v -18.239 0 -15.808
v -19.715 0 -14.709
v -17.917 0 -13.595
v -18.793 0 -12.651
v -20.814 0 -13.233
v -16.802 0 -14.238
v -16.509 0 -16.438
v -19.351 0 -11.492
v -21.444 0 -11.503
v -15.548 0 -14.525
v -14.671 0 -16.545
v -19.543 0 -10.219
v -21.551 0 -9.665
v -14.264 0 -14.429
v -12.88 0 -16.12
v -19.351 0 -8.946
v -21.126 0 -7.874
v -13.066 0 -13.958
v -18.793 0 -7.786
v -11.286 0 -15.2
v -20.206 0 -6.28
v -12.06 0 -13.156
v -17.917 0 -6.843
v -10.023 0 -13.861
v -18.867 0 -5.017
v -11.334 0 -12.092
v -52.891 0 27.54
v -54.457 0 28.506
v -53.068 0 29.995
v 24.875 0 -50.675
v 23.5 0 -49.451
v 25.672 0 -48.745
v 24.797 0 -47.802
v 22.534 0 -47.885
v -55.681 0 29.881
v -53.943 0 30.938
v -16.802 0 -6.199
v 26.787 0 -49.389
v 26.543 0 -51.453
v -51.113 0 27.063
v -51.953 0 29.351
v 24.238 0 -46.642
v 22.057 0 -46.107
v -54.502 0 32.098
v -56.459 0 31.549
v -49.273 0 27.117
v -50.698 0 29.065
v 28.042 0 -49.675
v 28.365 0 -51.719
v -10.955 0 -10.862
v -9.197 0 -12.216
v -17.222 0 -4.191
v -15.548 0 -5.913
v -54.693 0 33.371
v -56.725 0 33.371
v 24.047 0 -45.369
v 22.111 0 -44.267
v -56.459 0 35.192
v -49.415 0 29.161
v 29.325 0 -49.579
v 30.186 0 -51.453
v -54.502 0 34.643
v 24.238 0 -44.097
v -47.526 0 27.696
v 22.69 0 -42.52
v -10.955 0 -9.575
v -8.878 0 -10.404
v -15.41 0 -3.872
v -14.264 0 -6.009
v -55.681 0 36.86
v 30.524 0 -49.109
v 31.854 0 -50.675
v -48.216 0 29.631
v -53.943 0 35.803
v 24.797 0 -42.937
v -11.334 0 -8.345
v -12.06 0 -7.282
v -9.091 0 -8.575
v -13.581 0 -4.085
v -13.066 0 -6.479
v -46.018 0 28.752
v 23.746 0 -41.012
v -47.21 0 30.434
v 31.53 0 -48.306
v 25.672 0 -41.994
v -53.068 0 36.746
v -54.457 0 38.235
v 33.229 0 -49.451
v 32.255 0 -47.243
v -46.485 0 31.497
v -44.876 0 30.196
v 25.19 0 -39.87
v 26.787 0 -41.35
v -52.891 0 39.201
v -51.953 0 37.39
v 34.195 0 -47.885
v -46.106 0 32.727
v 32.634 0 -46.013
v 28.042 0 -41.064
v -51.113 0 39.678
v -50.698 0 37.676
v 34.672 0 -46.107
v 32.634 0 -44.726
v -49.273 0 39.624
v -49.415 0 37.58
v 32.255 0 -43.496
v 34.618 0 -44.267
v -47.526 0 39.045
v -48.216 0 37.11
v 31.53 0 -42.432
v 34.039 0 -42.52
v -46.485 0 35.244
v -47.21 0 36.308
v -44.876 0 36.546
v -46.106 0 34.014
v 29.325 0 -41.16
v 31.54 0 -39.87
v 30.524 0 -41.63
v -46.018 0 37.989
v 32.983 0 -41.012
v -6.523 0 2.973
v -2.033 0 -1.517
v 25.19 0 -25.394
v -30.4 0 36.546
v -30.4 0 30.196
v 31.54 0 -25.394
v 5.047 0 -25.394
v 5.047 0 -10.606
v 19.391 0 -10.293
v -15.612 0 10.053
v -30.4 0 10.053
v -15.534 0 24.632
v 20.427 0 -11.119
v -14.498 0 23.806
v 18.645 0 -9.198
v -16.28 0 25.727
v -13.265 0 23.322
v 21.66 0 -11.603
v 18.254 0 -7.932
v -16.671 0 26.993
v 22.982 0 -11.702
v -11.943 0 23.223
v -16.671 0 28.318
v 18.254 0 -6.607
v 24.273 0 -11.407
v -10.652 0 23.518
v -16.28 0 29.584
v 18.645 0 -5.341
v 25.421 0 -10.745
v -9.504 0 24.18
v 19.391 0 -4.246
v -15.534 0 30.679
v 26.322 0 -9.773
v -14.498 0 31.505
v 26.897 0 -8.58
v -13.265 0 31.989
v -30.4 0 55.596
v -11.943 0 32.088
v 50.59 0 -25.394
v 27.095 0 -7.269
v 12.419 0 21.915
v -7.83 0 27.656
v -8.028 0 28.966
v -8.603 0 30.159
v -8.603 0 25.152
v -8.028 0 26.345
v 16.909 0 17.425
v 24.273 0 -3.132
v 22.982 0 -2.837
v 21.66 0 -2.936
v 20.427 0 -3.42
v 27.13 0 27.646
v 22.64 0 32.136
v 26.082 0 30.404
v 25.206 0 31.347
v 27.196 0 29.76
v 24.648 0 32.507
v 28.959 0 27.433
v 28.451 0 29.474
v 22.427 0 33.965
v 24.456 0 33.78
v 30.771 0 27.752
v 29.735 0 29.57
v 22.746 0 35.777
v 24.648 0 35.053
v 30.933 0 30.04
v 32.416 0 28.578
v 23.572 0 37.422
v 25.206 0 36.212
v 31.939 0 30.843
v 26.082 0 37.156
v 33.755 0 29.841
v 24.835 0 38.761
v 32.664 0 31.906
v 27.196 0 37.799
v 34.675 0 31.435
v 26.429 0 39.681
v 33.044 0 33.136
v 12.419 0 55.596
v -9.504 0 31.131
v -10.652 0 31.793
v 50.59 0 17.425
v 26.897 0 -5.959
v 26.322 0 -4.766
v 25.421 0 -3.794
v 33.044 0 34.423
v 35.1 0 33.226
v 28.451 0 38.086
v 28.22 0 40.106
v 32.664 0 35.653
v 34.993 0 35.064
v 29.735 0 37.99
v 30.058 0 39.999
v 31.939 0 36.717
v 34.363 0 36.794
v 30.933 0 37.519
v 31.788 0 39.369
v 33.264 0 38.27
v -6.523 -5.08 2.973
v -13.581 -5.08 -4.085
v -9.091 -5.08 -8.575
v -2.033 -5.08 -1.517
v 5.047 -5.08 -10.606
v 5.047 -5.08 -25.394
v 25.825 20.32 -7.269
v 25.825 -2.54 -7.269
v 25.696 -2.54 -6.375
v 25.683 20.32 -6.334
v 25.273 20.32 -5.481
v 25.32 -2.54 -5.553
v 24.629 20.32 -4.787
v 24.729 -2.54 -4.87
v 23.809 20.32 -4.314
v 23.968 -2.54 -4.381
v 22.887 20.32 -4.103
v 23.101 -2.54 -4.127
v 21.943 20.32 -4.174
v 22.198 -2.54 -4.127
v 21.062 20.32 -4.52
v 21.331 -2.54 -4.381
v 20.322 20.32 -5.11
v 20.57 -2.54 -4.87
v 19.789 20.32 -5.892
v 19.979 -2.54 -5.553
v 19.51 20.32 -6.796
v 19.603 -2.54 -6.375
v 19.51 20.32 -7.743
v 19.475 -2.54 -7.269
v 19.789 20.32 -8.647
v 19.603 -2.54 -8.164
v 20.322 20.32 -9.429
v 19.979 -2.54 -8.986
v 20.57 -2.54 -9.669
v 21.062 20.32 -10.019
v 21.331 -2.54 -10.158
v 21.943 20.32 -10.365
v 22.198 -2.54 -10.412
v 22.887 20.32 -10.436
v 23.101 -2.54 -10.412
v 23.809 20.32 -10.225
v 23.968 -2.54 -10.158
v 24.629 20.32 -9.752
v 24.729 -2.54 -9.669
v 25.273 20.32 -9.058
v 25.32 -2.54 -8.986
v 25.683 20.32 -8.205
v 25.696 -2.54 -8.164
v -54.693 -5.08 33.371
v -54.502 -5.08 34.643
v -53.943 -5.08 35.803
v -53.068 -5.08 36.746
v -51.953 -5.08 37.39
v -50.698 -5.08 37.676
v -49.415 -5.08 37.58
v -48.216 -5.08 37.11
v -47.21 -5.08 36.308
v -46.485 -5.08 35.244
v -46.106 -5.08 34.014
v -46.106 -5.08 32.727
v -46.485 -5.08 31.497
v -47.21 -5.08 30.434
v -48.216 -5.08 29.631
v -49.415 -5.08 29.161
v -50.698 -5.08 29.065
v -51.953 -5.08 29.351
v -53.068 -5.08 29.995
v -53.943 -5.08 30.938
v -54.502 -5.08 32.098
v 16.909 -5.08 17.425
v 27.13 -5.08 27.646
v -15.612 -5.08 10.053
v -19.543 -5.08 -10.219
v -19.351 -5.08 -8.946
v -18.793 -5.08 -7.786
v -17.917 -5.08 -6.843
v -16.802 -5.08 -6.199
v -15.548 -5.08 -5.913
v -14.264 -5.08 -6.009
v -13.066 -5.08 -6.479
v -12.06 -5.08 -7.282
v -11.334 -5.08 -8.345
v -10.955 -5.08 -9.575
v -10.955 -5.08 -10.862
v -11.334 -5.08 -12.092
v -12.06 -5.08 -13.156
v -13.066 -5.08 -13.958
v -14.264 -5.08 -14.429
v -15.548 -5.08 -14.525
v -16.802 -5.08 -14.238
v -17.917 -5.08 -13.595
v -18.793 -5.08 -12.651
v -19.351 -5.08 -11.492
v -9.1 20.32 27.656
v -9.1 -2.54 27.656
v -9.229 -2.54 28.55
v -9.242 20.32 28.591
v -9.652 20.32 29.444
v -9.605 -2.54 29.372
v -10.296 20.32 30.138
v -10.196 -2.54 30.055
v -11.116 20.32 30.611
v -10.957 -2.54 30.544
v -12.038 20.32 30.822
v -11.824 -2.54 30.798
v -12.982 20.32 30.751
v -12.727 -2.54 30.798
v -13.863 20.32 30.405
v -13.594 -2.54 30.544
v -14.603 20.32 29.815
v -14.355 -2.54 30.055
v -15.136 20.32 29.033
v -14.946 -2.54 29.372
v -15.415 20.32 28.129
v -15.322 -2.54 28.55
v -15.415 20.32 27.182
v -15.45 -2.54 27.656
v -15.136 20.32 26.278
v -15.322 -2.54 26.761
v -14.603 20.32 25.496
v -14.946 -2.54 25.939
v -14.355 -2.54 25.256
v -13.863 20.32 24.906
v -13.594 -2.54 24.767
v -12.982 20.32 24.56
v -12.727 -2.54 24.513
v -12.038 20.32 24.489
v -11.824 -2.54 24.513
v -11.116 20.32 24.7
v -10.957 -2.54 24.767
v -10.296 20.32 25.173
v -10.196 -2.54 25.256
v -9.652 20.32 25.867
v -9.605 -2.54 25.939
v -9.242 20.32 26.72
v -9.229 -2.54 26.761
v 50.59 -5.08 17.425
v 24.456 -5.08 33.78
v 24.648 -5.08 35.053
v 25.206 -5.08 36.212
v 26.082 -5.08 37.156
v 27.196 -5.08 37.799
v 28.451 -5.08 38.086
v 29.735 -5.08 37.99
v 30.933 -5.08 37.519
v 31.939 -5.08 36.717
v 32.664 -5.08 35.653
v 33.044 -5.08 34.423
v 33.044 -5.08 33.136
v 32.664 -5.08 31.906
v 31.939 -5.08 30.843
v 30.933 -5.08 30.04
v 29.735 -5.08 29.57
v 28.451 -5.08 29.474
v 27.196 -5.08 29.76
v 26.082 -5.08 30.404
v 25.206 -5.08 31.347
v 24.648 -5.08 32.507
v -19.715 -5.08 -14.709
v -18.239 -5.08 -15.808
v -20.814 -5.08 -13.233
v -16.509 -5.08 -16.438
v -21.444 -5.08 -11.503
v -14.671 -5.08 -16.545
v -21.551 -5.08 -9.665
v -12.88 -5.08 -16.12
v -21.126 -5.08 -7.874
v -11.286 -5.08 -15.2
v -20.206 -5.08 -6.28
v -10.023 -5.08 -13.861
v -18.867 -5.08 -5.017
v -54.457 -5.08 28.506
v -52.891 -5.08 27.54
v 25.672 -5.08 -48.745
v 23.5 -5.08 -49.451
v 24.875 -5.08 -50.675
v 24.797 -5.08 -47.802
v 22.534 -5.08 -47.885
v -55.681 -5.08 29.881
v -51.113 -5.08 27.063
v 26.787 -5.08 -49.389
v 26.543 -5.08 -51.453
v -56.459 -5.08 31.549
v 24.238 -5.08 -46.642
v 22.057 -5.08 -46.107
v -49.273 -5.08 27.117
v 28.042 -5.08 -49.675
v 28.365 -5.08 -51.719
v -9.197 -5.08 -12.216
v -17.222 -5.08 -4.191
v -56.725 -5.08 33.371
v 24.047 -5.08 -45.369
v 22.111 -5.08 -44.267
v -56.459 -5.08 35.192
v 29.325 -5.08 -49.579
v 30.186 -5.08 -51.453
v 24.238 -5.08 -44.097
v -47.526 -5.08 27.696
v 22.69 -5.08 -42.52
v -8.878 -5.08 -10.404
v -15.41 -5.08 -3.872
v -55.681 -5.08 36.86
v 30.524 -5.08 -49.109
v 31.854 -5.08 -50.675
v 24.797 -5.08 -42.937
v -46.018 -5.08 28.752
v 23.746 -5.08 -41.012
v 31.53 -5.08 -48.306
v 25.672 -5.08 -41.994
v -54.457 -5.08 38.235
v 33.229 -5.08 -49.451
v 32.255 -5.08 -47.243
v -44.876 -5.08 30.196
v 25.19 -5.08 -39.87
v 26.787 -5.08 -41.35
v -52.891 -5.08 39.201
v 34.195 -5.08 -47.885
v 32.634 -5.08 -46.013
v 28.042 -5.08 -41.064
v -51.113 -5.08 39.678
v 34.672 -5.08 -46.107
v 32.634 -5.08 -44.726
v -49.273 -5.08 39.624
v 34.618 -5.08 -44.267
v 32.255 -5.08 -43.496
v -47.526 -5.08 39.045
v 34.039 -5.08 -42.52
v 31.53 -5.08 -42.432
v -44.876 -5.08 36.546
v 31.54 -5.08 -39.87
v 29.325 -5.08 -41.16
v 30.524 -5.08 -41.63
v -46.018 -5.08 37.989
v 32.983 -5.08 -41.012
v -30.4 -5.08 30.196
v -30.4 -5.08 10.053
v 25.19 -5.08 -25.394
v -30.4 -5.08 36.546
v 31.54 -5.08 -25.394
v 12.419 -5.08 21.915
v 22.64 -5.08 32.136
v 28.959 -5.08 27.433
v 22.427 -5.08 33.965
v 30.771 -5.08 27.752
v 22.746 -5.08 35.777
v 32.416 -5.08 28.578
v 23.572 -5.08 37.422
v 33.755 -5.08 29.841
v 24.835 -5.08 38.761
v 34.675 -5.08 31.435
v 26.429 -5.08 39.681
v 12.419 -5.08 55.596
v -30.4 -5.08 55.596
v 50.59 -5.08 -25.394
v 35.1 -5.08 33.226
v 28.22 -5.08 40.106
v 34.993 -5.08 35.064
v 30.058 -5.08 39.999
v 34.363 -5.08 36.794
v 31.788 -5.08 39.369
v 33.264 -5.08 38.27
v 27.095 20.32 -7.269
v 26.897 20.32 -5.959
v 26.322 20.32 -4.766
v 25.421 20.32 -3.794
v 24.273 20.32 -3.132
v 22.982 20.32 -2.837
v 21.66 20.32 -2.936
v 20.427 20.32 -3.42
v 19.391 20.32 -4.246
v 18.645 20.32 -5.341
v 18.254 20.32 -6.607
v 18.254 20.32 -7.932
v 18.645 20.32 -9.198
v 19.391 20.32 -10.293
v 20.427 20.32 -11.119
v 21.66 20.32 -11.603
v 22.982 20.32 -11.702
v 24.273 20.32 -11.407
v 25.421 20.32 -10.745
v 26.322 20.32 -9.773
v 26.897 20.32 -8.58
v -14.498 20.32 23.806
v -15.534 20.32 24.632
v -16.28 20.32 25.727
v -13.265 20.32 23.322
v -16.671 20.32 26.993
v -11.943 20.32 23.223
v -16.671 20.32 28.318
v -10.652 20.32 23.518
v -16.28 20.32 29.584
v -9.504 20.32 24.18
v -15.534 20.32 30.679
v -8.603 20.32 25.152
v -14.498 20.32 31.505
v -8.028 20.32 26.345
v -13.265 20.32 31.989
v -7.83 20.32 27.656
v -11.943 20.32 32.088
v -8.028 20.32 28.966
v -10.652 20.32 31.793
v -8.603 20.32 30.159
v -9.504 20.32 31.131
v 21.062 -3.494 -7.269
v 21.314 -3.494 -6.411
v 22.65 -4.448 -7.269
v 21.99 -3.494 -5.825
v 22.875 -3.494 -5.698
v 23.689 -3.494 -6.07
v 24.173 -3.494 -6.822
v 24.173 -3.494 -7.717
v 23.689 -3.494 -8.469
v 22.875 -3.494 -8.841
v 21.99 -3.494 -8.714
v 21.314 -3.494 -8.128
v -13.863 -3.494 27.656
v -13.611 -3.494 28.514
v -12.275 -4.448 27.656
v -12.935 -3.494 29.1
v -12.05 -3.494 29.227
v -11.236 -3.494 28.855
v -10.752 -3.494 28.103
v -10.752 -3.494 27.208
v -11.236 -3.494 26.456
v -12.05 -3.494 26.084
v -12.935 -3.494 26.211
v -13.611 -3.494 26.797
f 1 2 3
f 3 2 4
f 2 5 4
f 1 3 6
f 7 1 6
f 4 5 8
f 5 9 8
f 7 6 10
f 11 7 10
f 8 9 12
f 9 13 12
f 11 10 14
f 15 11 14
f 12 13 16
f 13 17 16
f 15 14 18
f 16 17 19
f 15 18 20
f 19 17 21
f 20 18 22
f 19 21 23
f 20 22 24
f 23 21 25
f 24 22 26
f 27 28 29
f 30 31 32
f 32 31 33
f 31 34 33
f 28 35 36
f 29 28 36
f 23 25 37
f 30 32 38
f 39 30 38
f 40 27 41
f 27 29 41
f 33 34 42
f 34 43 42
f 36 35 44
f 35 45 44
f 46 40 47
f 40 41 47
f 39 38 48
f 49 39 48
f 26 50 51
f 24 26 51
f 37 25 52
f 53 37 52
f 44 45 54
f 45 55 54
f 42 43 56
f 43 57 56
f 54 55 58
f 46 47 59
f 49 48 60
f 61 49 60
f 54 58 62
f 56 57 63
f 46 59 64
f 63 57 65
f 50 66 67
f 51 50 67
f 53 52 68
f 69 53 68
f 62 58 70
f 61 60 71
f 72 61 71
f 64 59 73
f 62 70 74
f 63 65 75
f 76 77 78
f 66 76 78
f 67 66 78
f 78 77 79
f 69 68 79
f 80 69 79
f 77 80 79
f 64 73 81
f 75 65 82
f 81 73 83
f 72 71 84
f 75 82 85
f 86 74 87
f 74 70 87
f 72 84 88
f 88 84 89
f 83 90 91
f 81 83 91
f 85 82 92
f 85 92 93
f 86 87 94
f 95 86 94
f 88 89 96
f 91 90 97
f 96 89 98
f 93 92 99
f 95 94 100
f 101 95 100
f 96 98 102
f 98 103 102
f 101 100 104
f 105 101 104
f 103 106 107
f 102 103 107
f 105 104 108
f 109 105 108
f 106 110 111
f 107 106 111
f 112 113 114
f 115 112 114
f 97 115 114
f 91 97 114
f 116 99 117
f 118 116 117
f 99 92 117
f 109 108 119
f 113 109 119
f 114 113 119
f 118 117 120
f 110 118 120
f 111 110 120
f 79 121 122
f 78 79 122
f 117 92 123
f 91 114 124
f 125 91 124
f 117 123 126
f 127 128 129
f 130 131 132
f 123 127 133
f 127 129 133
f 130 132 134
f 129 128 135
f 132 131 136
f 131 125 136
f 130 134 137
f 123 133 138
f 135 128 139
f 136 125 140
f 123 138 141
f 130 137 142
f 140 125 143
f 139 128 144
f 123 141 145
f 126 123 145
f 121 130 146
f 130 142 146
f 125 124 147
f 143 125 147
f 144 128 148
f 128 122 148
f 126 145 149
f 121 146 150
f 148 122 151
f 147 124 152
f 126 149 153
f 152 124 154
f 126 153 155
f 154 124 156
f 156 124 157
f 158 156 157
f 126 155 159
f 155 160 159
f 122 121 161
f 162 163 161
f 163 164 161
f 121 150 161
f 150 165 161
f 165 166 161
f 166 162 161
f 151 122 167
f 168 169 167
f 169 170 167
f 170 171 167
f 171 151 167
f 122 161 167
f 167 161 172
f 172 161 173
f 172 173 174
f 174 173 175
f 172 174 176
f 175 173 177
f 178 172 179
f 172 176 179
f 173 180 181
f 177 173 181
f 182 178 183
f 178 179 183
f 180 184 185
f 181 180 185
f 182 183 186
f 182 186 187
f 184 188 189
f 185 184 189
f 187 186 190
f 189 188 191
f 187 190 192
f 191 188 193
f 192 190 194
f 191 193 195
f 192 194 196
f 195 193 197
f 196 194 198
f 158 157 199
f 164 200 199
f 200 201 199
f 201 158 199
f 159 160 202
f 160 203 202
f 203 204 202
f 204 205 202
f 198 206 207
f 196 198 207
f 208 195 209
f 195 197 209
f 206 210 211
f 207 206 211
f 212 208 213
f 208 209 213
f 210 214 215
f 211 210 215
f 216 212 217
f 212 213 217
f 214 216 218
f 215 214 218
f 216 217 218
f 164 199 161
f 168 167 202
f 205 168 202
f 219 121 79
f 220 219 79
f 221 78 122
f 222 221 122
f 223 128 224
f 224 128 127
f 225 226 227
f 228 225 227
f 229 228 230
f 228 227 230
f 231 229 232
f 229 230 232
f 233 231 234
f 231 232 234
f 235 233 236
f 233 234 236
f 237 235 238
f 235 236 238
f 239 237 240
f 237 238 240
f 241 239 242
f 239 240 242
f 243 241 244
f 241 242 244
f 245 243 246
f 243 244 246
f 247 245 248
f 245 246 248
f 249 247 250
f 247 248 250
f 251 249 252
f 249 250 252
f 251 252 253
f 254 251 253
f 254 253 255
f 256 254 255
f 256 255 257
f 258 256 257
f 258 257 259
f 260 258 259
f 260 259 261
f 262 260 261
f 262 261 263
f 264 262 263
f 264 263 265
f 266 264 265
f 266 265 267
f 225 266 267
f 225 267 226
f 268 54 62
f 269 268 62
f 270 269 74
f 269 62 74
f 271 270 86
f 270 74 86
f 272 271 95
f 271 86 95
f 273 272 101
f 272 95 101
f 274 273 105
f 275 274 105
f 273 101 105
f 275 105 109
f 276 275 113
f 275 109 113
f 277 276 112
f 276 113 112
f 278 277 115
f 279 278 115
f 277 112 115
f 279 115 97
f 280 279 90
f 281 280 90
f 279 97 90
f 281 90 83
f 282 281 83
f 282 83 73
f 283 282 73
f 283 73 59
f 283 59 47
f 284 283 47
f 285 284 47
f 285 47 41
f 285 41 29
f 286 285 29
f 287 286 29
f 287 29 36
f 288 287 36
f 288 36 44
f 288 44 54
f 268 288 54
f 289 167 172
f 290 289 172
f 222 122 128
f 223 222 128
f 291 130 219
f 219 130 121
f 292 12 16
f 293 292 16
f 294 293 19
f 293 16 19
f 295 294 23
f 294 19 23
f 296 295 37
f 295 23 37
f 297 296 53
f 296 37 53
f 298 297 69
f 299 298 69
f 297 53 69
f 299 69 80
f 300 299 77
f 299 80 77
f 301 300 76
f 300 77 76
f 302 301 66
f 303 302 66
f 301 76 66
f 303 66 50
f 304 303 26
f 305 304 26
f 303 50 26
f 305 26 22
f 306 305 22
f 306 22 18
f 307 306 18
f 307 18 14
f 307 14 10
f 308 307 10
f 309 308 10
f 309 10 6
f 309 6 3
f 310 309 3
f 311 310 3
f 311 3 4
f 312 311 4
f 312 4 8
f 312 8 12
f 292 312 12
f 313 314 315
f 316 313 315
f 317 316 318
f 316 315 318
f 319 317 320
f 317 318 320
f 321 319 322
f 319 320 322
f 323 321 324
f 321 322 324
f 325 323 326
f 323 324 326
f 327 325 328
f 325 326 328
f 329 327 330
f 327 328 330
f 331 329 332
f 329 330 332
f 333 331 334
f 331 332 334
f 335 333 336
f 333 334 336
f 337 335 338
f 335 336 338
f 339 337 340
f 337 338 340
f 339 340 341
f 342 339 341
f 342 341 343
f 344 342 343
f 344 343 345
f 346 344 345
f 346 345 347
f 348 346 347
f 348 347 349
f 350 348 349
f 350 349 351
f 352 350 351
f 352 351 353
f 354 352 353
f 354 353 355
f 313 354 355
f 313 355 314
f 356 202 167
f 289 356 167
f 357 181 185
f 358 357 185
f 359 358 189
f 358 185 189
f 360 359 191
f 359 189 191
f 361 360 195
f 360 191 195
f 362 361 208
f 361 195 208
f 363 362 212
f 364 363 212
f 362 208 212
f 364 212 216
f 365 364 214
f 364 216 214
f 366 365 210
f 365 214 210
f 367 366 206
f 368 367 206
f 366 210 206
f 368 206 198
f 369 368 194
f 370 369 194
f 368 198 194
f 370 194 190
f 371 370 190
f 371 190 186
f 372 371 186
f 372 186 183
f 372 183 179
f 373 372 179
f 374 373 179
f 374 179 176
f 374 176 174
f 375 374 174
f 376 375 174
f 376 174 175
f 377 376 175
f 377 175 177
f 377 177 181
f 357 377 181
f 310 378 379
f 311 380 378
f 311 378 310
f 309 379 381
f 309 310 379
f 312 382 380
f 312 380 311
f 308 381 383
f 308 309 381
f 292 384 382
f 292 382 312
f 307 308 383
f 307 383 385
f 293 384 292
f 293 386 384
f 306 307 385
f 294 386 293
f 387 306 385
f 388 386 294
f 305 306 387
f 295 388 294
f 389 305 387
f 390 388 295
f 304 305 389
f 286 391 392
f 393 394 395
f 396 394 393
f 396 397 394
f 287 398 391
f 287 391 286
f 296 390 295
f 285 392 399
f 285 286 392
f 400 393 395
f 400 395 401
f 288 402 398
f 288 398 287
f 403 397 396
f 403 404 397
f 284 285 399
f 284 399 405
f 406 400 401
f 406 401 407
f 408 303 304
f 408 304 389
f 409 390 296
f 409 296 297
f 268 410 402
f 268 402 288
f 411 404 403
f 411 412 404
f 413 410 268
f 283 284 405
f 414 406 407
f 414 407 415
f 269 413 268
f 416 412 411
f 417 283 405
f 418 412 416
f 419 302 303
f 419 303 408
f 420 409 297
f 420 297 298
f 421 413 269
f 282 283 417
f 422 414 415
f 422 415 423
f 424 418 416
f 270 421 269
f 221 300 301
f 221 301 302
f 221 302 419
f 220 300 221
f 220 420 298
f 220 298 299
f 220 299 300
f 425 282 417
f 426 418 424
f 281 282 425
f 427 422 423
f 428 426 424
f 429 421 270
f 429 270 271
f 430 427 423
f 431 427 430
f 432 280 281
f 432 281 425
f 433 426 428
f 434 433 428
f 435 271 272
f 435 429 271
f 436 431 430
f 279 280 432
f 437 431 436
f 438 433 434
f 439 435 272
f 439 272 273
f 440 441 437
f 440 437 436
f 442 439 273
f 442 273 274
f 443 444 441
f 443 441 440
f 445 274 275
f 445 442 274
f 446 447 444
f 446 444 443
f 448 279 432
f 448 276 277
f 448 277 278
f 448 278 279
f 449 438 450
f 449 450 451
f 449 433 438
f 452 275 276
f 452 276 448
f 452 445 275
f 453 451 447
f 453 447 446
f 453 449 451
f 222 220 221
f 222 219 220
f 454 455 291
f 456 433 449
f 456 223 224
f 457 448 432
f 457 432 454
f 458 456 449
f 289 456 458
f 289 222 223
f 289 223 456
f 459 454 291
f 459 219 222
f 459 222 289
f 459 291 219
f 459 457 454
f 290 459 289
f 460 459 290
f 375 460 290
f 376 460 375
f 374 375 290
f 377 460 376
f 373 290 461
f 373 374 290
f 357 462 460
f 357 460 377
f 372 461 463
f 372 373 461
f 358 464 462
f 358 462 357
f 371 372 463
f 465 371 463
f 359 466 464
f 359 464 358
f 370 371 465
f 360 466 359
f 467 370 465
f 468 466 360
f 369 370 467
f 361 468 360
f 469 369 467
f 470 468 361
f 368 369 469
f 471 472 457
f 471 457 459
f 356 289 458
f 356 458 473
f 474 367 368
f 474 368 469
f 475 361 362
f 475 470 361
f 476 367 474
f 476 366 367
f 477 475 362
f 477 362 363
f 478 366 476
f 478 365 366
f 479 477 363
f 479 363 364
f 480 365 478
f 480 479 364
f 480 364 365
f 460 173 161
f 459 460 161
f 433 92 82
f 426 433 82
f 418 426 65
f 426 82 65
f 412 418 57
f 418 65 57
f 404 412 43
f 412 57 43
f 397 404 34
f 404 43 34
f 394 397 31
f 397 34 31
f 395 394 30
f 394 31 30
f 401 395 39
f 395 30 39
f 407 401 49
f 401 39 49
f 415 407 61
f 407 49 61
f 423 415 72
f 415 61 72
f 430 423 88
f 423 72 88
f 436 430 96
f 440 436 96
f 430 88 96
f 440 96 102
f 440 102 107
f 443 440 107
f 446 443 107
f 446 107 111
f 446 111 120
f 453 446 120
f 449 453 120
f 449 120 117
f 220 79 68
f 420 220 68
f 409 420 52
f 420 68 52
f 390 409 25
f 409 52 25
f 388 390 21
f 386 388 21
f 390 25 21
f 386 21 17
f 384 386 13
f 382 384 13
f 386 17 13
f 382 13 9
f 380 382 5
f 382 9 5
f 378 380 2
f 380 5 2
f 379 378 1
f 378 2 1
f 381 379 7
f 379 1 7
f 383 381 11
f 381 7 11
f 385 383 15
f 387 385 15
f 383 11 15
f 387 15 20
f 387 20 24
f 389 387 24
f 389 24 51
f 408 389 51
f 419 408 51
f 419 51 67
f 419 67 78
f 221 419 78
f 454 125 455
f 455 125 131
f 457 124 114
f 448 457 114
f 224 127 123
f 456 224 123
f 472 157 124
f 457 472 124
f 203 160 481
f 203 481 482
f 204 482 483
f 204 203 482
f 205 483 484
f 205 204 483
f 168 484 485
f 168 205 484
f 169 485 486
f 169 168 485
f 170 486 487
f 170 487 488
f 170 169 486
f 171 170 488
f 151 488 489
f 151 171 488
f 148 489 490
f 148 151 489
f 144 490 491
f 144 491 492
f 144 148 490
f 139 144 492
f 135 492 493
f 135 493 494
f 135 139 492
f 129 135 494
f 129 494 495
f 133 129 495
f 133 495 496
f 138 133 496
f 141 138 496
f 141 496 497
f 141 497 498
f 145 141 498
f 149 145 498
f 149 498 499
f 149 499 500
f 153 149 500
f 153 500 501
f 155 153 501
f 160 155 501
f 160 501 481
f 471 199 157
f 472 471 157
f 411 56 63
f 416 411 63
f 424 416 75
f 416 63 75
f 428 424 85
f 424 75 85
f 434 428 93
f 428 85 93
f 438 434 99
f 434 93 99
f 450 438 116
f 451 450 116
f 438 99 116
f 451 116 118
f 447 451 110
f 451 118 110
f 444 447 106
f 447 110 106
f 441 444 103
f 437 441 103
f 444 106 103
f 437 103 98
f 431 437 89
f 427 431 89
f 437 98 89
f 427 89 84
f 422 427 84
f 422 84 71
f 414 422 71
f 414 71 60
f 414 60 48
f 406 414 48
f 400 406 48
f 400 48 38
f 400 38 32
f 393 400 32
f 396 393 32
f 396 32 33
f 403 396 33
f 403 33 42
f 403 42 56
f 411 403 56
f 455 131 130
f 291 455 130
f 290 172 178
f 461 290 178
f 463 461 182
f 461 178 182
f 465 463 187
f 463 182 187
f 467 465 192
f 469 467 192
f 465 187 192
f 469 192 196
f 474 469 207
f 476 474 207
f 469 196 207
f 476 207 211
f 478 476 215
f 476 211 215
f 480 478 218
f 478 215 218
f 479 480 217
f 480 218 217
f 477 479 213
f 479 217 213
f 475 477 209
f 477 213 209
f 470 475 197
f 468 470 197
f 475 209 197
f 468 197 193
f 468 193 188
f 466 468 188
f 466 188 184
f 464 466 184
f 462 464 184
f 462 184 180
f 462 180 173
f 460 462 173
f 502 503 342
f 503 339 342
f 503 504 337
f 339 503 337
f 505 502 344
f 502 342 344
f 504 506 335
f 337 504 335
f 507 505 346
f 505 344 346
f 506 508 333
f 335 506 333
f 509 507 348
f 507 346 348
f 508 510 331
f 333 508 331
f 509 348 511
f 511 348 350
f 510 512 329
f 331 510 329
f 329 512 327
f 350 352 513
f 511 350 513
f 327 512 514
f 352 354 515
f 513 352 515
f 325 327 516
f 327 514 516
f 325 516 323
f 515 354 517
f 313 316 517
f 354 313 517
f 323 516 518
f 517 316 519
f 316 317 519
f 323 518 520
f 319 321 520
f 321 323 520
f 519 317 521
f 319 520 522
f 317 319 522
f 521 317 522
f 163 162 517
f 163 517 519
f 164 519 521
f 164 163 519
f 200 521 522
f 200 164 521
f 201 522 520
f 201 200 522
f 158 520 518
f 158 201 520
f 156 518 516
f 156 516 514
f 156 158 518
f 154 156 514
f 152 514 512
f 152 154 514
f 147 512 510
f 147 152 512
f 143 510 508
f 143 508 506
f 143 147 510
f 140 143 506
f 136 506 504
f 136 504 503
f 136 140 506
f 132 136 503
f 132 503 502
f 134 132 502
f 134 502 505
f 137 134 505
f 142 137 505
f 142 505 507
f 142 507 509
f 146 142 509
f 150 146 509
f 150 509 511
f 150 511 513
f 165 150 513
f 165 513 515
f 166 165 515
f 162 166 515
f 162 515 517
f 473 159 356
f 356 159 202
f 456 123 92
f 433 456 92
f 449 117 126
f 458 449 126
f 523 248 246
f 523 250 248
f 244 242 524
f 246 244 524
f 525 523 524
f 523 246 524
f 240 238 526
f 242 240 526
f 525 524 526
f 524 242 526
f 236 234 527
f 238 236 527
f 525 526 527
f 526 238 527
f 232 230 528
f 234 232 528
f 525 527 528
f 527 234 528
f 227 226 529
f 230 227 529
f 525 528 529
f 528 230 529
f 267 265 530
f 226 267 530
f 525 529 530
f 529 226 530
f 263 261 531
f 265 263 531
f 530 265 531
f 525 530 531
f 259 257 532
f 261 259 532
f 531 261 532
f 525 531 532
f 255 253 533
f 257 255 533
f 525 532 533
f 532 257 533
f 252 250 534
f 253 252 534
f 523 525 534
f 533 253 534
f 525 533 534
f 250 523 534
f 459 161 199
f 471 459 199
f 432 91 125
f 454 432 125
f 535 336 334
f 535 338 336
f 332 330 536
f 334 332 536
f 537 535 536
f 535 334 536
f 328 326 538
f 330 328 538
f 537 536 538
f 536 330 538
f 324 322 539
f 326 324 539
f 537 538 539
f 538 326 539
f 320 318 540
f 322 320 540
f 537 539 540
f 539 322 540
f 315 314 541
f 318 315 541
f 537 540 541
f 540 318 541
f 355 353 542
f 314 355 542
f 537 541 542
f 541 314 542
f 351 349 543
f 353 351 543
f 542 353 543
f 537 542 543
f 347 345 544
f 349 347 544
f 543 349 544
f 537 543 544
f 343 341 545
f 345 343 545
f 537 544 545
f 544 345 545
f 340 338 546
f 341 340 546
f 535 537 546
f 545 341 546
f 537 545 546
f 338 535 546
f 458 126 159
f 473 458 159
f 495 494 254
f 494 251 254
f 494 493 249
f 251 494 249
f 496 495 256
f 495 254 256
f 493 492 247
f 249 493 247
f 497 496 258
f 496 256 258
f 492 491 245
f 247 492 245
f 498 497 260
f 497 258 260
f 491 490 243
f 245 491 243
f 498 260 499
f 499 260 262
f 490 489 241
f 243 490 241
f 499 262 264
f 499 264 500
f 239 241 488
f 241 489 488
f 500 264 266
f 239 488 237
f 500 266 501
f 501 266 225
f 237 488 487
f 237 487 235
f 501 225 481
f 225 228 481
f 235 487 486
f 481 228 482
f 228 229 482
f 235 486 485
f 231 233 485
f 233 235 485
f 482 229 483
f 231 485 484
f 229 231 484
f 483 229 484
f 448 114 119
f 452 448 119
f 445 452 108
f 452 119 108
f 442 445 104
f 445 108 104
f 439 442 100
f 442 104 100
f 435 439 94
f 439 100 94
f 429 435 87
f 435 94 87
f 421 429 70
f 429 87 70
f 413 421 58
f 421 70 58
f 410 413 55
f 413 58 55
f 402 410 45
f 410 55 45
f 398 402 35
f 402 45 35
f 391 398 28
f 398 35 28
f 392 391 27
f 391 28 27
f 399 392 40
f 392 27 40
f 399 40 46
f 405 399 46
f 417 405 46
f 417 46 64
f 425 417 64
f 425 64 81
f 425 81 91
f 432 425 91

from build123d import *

# Parameters (mm, degrees)
F0_R                 = 4.445
F1_DEPTH             = 5.08
F2_R                 = 4.445
F3_DEPTH             = 25.4
F4_R                 = 4.318
F5_DEPTH             = 25.4
F8_D                 = 6.35
F8_DEPTH             = 22.86
F8_CBORE_D           = 6.35
F8_CBORE_DEPTH       = 12.7
F8_TIP               = 1.9077324654
F8_ON_F7_D           = 6.35
F8_ON_F7_DEPTH       = 22.86
F8_ON_F7_CBORE_D     = 6.35
F8_ON_F7_CBORE_DEPTH = 12.7
F8_ON_F7_TIP         = 1.9077324654


with BuildPart() as f1:
    # F0 (on Front) → F1 (new body)
    with BuildSketch(Plane.XZ):
        with BuildLine():
            Line((16.9093859117, 17.425267489), (27.1303756598, 27.6462572371))
            ThreePointArc((27.1303756598, 27.6462572371), (33.2640046568, 38.2700142946), (22.6402475993, 32.1363852977))
            Line((22.6402475993, 32.1363852977), (12.4192578512, 21.9153955495))
            Line((12.4192578512, 21.9153955495), (12.4192578512, 36.5455265367))
            Line((12.4192578512, 36.5455265367), (12.4192578512, 55.5955265367))
            Line((12.4192578512, 55.5955265367), (-30.3997510844, 55.5955265367))
            Line((-30.3997510844, 55.5955265367), (-30.3997510844, 36.5455265367))
            Line((-30.3997510844, 36.5455265367), (-44.8762217871, 36.5455265367))
            ThreePointArc((-44.8762217871, 36.5455265367), (-56.7254831011, 33.3705265367), (-44.8762217871, 30.1955265367))
            Line((-44.8762217871, 30.1955265367), (-30.3997510844, 30.1955265367))
            Line((-30.3997510844, 30.1955265367), (-30.3997510844, 16.4088443772))
            Line((-30.3997510844, 16.4088443772), (-30.3997510844, 10.0526214838))
            Line((-30.3997510844, 10.0526214838), (-15.6116463411, 10.0526214838))
            Line((-15.6116463411, 10.0526214838), (-6.5234490096, 2.9726886888))
            Line((-6.5234490096, 2.9726886888), (-13.581341862, -4.0852041636))
            ThreePointArc((-13.581341862, -4.0852041636), (-19.714970859, -14.7089612211), (-9.0912138015, -8.5753322242))
            Line((-9.0912138015, -8.5753322242), (-2.033320949, -1.5174393717))
            Line((-2.033320949, -1.5174393717), (5.046611846, -10.6056367033))
            Line((5.046611846, -10.6056367033), (5.046611846, -25.3937414465))
            Line((5.046611846, -25.3937414465), (11.4028347394, -25.3937414465))
            Line((11.4028347394, -25.3937414465), (25.1895168989, -25.3937414465))
            Line((25.1895168989, -25.3937414465), (25.1895168989, -39.8702121492))
            ThreePointArc((25.1895168989, -39.8702121492), (28.3645168989, -51.7194734633), (31.5395168989, -39.8702121492))
            Line((31.5395168989, -39.8702121492), (31.5395168989, -25.3937414465))
            Line((31.5395168989, -25.3937414465), (50.5895168989, -25.3937414465))
            Line((50.5895168989, -25.3937414465), (50.5895168989, 17.425267489))
            Line((50.5895168989, 17.425267489), (31.5395168989, 17.425267489))
            Line((31.5395168989, 17.425267489), (16.9093859117, 17.425267489))
        make_face()
        with Locations((22.6495168989, -7.2694734633)):
            Circle(F0_R, mode=Mode.SUBTRACT)
        with Locations((-12.2754831011, 27.6555265367)):
            Circle(F0_R, mode=Mode.SUBTRACT)
    extrude(amount=F1_DEPTH)

    # F2 (on face) → F3 (join)
    with BuildSketch(Plane.XZ.offset(5.08)):
        with Locations((-12.2754831011, 27.6555265367)):
            Circle(F2_R)
        with Locations((22.6495168989, -7.2694734633)):
            Circle(F2_R)
    extrude(amount=-F3_DEPTH)

    # F4 (on face) → F5 (cut)
    with BuildSketch(Plane(origin=(0, 0, 0), x_dir=(-1, 0, 0), z_dir=(0, 1, 0))):
        with Locations((-28.7738765962, 33.7798862341)):
            Circle(F4_R)
        with Locations((15.2248427984, -10.2188331606)):
            Circle(F4_R)
        with Locations((50.3754831011, 33.3705265367)):
            Circle(F4_R)
        with Locations((-28.3645168989, -45.3694734633)):
            Circle(F4_R)
    extrude(amount=-F5_DEPTH, mode=Mode.SUBTRACT)

    # F8
    with Locations(Plane(origin=(0, 20.32, 0), x_dir=(-1, 0, 0), z_dir=(0, 1, 0))):
        with Locations((-22.6495168989, -7.2694734633)):
            CounterBoreHole(F8_D / 2, F8_CBORE_D / 2, F8_CBORE_DEPTH, depth=F8_DEPTH)
            with Locations((0, 0, -(F8_DEPTH + F8_TIP / 2))):  # 118° drill point
                Cone(0, F8_D / 2, F8_TIP, mode=Mode.SUBTRACT)

    # F8 on F7
    with Locations(Plane(origin=(0, 20.32, 0), x_dir=(-1, 0, 0), z_dir=(0, 1, 0))):
        with Locations((12.2754831011, 27.6555265367)):
            CounterBoreHole(F8_ON_F7_D / 2, F8_ON_F7_CBORE_D / 2, F8_ON_F7_CBORE_DEPTH, depth=F8_ON_F7_DEPTH)
            with Locations((0, 0, -(F8_ON_F7_DEPTH + F8_ON_F7_TIP / 2))):  # 118° drill point
                Cone(0, F8_ON_F7_D / 2, F8_ON_F7_TIP, mode=Mode.SUBTRACT)


solid = f1.part
